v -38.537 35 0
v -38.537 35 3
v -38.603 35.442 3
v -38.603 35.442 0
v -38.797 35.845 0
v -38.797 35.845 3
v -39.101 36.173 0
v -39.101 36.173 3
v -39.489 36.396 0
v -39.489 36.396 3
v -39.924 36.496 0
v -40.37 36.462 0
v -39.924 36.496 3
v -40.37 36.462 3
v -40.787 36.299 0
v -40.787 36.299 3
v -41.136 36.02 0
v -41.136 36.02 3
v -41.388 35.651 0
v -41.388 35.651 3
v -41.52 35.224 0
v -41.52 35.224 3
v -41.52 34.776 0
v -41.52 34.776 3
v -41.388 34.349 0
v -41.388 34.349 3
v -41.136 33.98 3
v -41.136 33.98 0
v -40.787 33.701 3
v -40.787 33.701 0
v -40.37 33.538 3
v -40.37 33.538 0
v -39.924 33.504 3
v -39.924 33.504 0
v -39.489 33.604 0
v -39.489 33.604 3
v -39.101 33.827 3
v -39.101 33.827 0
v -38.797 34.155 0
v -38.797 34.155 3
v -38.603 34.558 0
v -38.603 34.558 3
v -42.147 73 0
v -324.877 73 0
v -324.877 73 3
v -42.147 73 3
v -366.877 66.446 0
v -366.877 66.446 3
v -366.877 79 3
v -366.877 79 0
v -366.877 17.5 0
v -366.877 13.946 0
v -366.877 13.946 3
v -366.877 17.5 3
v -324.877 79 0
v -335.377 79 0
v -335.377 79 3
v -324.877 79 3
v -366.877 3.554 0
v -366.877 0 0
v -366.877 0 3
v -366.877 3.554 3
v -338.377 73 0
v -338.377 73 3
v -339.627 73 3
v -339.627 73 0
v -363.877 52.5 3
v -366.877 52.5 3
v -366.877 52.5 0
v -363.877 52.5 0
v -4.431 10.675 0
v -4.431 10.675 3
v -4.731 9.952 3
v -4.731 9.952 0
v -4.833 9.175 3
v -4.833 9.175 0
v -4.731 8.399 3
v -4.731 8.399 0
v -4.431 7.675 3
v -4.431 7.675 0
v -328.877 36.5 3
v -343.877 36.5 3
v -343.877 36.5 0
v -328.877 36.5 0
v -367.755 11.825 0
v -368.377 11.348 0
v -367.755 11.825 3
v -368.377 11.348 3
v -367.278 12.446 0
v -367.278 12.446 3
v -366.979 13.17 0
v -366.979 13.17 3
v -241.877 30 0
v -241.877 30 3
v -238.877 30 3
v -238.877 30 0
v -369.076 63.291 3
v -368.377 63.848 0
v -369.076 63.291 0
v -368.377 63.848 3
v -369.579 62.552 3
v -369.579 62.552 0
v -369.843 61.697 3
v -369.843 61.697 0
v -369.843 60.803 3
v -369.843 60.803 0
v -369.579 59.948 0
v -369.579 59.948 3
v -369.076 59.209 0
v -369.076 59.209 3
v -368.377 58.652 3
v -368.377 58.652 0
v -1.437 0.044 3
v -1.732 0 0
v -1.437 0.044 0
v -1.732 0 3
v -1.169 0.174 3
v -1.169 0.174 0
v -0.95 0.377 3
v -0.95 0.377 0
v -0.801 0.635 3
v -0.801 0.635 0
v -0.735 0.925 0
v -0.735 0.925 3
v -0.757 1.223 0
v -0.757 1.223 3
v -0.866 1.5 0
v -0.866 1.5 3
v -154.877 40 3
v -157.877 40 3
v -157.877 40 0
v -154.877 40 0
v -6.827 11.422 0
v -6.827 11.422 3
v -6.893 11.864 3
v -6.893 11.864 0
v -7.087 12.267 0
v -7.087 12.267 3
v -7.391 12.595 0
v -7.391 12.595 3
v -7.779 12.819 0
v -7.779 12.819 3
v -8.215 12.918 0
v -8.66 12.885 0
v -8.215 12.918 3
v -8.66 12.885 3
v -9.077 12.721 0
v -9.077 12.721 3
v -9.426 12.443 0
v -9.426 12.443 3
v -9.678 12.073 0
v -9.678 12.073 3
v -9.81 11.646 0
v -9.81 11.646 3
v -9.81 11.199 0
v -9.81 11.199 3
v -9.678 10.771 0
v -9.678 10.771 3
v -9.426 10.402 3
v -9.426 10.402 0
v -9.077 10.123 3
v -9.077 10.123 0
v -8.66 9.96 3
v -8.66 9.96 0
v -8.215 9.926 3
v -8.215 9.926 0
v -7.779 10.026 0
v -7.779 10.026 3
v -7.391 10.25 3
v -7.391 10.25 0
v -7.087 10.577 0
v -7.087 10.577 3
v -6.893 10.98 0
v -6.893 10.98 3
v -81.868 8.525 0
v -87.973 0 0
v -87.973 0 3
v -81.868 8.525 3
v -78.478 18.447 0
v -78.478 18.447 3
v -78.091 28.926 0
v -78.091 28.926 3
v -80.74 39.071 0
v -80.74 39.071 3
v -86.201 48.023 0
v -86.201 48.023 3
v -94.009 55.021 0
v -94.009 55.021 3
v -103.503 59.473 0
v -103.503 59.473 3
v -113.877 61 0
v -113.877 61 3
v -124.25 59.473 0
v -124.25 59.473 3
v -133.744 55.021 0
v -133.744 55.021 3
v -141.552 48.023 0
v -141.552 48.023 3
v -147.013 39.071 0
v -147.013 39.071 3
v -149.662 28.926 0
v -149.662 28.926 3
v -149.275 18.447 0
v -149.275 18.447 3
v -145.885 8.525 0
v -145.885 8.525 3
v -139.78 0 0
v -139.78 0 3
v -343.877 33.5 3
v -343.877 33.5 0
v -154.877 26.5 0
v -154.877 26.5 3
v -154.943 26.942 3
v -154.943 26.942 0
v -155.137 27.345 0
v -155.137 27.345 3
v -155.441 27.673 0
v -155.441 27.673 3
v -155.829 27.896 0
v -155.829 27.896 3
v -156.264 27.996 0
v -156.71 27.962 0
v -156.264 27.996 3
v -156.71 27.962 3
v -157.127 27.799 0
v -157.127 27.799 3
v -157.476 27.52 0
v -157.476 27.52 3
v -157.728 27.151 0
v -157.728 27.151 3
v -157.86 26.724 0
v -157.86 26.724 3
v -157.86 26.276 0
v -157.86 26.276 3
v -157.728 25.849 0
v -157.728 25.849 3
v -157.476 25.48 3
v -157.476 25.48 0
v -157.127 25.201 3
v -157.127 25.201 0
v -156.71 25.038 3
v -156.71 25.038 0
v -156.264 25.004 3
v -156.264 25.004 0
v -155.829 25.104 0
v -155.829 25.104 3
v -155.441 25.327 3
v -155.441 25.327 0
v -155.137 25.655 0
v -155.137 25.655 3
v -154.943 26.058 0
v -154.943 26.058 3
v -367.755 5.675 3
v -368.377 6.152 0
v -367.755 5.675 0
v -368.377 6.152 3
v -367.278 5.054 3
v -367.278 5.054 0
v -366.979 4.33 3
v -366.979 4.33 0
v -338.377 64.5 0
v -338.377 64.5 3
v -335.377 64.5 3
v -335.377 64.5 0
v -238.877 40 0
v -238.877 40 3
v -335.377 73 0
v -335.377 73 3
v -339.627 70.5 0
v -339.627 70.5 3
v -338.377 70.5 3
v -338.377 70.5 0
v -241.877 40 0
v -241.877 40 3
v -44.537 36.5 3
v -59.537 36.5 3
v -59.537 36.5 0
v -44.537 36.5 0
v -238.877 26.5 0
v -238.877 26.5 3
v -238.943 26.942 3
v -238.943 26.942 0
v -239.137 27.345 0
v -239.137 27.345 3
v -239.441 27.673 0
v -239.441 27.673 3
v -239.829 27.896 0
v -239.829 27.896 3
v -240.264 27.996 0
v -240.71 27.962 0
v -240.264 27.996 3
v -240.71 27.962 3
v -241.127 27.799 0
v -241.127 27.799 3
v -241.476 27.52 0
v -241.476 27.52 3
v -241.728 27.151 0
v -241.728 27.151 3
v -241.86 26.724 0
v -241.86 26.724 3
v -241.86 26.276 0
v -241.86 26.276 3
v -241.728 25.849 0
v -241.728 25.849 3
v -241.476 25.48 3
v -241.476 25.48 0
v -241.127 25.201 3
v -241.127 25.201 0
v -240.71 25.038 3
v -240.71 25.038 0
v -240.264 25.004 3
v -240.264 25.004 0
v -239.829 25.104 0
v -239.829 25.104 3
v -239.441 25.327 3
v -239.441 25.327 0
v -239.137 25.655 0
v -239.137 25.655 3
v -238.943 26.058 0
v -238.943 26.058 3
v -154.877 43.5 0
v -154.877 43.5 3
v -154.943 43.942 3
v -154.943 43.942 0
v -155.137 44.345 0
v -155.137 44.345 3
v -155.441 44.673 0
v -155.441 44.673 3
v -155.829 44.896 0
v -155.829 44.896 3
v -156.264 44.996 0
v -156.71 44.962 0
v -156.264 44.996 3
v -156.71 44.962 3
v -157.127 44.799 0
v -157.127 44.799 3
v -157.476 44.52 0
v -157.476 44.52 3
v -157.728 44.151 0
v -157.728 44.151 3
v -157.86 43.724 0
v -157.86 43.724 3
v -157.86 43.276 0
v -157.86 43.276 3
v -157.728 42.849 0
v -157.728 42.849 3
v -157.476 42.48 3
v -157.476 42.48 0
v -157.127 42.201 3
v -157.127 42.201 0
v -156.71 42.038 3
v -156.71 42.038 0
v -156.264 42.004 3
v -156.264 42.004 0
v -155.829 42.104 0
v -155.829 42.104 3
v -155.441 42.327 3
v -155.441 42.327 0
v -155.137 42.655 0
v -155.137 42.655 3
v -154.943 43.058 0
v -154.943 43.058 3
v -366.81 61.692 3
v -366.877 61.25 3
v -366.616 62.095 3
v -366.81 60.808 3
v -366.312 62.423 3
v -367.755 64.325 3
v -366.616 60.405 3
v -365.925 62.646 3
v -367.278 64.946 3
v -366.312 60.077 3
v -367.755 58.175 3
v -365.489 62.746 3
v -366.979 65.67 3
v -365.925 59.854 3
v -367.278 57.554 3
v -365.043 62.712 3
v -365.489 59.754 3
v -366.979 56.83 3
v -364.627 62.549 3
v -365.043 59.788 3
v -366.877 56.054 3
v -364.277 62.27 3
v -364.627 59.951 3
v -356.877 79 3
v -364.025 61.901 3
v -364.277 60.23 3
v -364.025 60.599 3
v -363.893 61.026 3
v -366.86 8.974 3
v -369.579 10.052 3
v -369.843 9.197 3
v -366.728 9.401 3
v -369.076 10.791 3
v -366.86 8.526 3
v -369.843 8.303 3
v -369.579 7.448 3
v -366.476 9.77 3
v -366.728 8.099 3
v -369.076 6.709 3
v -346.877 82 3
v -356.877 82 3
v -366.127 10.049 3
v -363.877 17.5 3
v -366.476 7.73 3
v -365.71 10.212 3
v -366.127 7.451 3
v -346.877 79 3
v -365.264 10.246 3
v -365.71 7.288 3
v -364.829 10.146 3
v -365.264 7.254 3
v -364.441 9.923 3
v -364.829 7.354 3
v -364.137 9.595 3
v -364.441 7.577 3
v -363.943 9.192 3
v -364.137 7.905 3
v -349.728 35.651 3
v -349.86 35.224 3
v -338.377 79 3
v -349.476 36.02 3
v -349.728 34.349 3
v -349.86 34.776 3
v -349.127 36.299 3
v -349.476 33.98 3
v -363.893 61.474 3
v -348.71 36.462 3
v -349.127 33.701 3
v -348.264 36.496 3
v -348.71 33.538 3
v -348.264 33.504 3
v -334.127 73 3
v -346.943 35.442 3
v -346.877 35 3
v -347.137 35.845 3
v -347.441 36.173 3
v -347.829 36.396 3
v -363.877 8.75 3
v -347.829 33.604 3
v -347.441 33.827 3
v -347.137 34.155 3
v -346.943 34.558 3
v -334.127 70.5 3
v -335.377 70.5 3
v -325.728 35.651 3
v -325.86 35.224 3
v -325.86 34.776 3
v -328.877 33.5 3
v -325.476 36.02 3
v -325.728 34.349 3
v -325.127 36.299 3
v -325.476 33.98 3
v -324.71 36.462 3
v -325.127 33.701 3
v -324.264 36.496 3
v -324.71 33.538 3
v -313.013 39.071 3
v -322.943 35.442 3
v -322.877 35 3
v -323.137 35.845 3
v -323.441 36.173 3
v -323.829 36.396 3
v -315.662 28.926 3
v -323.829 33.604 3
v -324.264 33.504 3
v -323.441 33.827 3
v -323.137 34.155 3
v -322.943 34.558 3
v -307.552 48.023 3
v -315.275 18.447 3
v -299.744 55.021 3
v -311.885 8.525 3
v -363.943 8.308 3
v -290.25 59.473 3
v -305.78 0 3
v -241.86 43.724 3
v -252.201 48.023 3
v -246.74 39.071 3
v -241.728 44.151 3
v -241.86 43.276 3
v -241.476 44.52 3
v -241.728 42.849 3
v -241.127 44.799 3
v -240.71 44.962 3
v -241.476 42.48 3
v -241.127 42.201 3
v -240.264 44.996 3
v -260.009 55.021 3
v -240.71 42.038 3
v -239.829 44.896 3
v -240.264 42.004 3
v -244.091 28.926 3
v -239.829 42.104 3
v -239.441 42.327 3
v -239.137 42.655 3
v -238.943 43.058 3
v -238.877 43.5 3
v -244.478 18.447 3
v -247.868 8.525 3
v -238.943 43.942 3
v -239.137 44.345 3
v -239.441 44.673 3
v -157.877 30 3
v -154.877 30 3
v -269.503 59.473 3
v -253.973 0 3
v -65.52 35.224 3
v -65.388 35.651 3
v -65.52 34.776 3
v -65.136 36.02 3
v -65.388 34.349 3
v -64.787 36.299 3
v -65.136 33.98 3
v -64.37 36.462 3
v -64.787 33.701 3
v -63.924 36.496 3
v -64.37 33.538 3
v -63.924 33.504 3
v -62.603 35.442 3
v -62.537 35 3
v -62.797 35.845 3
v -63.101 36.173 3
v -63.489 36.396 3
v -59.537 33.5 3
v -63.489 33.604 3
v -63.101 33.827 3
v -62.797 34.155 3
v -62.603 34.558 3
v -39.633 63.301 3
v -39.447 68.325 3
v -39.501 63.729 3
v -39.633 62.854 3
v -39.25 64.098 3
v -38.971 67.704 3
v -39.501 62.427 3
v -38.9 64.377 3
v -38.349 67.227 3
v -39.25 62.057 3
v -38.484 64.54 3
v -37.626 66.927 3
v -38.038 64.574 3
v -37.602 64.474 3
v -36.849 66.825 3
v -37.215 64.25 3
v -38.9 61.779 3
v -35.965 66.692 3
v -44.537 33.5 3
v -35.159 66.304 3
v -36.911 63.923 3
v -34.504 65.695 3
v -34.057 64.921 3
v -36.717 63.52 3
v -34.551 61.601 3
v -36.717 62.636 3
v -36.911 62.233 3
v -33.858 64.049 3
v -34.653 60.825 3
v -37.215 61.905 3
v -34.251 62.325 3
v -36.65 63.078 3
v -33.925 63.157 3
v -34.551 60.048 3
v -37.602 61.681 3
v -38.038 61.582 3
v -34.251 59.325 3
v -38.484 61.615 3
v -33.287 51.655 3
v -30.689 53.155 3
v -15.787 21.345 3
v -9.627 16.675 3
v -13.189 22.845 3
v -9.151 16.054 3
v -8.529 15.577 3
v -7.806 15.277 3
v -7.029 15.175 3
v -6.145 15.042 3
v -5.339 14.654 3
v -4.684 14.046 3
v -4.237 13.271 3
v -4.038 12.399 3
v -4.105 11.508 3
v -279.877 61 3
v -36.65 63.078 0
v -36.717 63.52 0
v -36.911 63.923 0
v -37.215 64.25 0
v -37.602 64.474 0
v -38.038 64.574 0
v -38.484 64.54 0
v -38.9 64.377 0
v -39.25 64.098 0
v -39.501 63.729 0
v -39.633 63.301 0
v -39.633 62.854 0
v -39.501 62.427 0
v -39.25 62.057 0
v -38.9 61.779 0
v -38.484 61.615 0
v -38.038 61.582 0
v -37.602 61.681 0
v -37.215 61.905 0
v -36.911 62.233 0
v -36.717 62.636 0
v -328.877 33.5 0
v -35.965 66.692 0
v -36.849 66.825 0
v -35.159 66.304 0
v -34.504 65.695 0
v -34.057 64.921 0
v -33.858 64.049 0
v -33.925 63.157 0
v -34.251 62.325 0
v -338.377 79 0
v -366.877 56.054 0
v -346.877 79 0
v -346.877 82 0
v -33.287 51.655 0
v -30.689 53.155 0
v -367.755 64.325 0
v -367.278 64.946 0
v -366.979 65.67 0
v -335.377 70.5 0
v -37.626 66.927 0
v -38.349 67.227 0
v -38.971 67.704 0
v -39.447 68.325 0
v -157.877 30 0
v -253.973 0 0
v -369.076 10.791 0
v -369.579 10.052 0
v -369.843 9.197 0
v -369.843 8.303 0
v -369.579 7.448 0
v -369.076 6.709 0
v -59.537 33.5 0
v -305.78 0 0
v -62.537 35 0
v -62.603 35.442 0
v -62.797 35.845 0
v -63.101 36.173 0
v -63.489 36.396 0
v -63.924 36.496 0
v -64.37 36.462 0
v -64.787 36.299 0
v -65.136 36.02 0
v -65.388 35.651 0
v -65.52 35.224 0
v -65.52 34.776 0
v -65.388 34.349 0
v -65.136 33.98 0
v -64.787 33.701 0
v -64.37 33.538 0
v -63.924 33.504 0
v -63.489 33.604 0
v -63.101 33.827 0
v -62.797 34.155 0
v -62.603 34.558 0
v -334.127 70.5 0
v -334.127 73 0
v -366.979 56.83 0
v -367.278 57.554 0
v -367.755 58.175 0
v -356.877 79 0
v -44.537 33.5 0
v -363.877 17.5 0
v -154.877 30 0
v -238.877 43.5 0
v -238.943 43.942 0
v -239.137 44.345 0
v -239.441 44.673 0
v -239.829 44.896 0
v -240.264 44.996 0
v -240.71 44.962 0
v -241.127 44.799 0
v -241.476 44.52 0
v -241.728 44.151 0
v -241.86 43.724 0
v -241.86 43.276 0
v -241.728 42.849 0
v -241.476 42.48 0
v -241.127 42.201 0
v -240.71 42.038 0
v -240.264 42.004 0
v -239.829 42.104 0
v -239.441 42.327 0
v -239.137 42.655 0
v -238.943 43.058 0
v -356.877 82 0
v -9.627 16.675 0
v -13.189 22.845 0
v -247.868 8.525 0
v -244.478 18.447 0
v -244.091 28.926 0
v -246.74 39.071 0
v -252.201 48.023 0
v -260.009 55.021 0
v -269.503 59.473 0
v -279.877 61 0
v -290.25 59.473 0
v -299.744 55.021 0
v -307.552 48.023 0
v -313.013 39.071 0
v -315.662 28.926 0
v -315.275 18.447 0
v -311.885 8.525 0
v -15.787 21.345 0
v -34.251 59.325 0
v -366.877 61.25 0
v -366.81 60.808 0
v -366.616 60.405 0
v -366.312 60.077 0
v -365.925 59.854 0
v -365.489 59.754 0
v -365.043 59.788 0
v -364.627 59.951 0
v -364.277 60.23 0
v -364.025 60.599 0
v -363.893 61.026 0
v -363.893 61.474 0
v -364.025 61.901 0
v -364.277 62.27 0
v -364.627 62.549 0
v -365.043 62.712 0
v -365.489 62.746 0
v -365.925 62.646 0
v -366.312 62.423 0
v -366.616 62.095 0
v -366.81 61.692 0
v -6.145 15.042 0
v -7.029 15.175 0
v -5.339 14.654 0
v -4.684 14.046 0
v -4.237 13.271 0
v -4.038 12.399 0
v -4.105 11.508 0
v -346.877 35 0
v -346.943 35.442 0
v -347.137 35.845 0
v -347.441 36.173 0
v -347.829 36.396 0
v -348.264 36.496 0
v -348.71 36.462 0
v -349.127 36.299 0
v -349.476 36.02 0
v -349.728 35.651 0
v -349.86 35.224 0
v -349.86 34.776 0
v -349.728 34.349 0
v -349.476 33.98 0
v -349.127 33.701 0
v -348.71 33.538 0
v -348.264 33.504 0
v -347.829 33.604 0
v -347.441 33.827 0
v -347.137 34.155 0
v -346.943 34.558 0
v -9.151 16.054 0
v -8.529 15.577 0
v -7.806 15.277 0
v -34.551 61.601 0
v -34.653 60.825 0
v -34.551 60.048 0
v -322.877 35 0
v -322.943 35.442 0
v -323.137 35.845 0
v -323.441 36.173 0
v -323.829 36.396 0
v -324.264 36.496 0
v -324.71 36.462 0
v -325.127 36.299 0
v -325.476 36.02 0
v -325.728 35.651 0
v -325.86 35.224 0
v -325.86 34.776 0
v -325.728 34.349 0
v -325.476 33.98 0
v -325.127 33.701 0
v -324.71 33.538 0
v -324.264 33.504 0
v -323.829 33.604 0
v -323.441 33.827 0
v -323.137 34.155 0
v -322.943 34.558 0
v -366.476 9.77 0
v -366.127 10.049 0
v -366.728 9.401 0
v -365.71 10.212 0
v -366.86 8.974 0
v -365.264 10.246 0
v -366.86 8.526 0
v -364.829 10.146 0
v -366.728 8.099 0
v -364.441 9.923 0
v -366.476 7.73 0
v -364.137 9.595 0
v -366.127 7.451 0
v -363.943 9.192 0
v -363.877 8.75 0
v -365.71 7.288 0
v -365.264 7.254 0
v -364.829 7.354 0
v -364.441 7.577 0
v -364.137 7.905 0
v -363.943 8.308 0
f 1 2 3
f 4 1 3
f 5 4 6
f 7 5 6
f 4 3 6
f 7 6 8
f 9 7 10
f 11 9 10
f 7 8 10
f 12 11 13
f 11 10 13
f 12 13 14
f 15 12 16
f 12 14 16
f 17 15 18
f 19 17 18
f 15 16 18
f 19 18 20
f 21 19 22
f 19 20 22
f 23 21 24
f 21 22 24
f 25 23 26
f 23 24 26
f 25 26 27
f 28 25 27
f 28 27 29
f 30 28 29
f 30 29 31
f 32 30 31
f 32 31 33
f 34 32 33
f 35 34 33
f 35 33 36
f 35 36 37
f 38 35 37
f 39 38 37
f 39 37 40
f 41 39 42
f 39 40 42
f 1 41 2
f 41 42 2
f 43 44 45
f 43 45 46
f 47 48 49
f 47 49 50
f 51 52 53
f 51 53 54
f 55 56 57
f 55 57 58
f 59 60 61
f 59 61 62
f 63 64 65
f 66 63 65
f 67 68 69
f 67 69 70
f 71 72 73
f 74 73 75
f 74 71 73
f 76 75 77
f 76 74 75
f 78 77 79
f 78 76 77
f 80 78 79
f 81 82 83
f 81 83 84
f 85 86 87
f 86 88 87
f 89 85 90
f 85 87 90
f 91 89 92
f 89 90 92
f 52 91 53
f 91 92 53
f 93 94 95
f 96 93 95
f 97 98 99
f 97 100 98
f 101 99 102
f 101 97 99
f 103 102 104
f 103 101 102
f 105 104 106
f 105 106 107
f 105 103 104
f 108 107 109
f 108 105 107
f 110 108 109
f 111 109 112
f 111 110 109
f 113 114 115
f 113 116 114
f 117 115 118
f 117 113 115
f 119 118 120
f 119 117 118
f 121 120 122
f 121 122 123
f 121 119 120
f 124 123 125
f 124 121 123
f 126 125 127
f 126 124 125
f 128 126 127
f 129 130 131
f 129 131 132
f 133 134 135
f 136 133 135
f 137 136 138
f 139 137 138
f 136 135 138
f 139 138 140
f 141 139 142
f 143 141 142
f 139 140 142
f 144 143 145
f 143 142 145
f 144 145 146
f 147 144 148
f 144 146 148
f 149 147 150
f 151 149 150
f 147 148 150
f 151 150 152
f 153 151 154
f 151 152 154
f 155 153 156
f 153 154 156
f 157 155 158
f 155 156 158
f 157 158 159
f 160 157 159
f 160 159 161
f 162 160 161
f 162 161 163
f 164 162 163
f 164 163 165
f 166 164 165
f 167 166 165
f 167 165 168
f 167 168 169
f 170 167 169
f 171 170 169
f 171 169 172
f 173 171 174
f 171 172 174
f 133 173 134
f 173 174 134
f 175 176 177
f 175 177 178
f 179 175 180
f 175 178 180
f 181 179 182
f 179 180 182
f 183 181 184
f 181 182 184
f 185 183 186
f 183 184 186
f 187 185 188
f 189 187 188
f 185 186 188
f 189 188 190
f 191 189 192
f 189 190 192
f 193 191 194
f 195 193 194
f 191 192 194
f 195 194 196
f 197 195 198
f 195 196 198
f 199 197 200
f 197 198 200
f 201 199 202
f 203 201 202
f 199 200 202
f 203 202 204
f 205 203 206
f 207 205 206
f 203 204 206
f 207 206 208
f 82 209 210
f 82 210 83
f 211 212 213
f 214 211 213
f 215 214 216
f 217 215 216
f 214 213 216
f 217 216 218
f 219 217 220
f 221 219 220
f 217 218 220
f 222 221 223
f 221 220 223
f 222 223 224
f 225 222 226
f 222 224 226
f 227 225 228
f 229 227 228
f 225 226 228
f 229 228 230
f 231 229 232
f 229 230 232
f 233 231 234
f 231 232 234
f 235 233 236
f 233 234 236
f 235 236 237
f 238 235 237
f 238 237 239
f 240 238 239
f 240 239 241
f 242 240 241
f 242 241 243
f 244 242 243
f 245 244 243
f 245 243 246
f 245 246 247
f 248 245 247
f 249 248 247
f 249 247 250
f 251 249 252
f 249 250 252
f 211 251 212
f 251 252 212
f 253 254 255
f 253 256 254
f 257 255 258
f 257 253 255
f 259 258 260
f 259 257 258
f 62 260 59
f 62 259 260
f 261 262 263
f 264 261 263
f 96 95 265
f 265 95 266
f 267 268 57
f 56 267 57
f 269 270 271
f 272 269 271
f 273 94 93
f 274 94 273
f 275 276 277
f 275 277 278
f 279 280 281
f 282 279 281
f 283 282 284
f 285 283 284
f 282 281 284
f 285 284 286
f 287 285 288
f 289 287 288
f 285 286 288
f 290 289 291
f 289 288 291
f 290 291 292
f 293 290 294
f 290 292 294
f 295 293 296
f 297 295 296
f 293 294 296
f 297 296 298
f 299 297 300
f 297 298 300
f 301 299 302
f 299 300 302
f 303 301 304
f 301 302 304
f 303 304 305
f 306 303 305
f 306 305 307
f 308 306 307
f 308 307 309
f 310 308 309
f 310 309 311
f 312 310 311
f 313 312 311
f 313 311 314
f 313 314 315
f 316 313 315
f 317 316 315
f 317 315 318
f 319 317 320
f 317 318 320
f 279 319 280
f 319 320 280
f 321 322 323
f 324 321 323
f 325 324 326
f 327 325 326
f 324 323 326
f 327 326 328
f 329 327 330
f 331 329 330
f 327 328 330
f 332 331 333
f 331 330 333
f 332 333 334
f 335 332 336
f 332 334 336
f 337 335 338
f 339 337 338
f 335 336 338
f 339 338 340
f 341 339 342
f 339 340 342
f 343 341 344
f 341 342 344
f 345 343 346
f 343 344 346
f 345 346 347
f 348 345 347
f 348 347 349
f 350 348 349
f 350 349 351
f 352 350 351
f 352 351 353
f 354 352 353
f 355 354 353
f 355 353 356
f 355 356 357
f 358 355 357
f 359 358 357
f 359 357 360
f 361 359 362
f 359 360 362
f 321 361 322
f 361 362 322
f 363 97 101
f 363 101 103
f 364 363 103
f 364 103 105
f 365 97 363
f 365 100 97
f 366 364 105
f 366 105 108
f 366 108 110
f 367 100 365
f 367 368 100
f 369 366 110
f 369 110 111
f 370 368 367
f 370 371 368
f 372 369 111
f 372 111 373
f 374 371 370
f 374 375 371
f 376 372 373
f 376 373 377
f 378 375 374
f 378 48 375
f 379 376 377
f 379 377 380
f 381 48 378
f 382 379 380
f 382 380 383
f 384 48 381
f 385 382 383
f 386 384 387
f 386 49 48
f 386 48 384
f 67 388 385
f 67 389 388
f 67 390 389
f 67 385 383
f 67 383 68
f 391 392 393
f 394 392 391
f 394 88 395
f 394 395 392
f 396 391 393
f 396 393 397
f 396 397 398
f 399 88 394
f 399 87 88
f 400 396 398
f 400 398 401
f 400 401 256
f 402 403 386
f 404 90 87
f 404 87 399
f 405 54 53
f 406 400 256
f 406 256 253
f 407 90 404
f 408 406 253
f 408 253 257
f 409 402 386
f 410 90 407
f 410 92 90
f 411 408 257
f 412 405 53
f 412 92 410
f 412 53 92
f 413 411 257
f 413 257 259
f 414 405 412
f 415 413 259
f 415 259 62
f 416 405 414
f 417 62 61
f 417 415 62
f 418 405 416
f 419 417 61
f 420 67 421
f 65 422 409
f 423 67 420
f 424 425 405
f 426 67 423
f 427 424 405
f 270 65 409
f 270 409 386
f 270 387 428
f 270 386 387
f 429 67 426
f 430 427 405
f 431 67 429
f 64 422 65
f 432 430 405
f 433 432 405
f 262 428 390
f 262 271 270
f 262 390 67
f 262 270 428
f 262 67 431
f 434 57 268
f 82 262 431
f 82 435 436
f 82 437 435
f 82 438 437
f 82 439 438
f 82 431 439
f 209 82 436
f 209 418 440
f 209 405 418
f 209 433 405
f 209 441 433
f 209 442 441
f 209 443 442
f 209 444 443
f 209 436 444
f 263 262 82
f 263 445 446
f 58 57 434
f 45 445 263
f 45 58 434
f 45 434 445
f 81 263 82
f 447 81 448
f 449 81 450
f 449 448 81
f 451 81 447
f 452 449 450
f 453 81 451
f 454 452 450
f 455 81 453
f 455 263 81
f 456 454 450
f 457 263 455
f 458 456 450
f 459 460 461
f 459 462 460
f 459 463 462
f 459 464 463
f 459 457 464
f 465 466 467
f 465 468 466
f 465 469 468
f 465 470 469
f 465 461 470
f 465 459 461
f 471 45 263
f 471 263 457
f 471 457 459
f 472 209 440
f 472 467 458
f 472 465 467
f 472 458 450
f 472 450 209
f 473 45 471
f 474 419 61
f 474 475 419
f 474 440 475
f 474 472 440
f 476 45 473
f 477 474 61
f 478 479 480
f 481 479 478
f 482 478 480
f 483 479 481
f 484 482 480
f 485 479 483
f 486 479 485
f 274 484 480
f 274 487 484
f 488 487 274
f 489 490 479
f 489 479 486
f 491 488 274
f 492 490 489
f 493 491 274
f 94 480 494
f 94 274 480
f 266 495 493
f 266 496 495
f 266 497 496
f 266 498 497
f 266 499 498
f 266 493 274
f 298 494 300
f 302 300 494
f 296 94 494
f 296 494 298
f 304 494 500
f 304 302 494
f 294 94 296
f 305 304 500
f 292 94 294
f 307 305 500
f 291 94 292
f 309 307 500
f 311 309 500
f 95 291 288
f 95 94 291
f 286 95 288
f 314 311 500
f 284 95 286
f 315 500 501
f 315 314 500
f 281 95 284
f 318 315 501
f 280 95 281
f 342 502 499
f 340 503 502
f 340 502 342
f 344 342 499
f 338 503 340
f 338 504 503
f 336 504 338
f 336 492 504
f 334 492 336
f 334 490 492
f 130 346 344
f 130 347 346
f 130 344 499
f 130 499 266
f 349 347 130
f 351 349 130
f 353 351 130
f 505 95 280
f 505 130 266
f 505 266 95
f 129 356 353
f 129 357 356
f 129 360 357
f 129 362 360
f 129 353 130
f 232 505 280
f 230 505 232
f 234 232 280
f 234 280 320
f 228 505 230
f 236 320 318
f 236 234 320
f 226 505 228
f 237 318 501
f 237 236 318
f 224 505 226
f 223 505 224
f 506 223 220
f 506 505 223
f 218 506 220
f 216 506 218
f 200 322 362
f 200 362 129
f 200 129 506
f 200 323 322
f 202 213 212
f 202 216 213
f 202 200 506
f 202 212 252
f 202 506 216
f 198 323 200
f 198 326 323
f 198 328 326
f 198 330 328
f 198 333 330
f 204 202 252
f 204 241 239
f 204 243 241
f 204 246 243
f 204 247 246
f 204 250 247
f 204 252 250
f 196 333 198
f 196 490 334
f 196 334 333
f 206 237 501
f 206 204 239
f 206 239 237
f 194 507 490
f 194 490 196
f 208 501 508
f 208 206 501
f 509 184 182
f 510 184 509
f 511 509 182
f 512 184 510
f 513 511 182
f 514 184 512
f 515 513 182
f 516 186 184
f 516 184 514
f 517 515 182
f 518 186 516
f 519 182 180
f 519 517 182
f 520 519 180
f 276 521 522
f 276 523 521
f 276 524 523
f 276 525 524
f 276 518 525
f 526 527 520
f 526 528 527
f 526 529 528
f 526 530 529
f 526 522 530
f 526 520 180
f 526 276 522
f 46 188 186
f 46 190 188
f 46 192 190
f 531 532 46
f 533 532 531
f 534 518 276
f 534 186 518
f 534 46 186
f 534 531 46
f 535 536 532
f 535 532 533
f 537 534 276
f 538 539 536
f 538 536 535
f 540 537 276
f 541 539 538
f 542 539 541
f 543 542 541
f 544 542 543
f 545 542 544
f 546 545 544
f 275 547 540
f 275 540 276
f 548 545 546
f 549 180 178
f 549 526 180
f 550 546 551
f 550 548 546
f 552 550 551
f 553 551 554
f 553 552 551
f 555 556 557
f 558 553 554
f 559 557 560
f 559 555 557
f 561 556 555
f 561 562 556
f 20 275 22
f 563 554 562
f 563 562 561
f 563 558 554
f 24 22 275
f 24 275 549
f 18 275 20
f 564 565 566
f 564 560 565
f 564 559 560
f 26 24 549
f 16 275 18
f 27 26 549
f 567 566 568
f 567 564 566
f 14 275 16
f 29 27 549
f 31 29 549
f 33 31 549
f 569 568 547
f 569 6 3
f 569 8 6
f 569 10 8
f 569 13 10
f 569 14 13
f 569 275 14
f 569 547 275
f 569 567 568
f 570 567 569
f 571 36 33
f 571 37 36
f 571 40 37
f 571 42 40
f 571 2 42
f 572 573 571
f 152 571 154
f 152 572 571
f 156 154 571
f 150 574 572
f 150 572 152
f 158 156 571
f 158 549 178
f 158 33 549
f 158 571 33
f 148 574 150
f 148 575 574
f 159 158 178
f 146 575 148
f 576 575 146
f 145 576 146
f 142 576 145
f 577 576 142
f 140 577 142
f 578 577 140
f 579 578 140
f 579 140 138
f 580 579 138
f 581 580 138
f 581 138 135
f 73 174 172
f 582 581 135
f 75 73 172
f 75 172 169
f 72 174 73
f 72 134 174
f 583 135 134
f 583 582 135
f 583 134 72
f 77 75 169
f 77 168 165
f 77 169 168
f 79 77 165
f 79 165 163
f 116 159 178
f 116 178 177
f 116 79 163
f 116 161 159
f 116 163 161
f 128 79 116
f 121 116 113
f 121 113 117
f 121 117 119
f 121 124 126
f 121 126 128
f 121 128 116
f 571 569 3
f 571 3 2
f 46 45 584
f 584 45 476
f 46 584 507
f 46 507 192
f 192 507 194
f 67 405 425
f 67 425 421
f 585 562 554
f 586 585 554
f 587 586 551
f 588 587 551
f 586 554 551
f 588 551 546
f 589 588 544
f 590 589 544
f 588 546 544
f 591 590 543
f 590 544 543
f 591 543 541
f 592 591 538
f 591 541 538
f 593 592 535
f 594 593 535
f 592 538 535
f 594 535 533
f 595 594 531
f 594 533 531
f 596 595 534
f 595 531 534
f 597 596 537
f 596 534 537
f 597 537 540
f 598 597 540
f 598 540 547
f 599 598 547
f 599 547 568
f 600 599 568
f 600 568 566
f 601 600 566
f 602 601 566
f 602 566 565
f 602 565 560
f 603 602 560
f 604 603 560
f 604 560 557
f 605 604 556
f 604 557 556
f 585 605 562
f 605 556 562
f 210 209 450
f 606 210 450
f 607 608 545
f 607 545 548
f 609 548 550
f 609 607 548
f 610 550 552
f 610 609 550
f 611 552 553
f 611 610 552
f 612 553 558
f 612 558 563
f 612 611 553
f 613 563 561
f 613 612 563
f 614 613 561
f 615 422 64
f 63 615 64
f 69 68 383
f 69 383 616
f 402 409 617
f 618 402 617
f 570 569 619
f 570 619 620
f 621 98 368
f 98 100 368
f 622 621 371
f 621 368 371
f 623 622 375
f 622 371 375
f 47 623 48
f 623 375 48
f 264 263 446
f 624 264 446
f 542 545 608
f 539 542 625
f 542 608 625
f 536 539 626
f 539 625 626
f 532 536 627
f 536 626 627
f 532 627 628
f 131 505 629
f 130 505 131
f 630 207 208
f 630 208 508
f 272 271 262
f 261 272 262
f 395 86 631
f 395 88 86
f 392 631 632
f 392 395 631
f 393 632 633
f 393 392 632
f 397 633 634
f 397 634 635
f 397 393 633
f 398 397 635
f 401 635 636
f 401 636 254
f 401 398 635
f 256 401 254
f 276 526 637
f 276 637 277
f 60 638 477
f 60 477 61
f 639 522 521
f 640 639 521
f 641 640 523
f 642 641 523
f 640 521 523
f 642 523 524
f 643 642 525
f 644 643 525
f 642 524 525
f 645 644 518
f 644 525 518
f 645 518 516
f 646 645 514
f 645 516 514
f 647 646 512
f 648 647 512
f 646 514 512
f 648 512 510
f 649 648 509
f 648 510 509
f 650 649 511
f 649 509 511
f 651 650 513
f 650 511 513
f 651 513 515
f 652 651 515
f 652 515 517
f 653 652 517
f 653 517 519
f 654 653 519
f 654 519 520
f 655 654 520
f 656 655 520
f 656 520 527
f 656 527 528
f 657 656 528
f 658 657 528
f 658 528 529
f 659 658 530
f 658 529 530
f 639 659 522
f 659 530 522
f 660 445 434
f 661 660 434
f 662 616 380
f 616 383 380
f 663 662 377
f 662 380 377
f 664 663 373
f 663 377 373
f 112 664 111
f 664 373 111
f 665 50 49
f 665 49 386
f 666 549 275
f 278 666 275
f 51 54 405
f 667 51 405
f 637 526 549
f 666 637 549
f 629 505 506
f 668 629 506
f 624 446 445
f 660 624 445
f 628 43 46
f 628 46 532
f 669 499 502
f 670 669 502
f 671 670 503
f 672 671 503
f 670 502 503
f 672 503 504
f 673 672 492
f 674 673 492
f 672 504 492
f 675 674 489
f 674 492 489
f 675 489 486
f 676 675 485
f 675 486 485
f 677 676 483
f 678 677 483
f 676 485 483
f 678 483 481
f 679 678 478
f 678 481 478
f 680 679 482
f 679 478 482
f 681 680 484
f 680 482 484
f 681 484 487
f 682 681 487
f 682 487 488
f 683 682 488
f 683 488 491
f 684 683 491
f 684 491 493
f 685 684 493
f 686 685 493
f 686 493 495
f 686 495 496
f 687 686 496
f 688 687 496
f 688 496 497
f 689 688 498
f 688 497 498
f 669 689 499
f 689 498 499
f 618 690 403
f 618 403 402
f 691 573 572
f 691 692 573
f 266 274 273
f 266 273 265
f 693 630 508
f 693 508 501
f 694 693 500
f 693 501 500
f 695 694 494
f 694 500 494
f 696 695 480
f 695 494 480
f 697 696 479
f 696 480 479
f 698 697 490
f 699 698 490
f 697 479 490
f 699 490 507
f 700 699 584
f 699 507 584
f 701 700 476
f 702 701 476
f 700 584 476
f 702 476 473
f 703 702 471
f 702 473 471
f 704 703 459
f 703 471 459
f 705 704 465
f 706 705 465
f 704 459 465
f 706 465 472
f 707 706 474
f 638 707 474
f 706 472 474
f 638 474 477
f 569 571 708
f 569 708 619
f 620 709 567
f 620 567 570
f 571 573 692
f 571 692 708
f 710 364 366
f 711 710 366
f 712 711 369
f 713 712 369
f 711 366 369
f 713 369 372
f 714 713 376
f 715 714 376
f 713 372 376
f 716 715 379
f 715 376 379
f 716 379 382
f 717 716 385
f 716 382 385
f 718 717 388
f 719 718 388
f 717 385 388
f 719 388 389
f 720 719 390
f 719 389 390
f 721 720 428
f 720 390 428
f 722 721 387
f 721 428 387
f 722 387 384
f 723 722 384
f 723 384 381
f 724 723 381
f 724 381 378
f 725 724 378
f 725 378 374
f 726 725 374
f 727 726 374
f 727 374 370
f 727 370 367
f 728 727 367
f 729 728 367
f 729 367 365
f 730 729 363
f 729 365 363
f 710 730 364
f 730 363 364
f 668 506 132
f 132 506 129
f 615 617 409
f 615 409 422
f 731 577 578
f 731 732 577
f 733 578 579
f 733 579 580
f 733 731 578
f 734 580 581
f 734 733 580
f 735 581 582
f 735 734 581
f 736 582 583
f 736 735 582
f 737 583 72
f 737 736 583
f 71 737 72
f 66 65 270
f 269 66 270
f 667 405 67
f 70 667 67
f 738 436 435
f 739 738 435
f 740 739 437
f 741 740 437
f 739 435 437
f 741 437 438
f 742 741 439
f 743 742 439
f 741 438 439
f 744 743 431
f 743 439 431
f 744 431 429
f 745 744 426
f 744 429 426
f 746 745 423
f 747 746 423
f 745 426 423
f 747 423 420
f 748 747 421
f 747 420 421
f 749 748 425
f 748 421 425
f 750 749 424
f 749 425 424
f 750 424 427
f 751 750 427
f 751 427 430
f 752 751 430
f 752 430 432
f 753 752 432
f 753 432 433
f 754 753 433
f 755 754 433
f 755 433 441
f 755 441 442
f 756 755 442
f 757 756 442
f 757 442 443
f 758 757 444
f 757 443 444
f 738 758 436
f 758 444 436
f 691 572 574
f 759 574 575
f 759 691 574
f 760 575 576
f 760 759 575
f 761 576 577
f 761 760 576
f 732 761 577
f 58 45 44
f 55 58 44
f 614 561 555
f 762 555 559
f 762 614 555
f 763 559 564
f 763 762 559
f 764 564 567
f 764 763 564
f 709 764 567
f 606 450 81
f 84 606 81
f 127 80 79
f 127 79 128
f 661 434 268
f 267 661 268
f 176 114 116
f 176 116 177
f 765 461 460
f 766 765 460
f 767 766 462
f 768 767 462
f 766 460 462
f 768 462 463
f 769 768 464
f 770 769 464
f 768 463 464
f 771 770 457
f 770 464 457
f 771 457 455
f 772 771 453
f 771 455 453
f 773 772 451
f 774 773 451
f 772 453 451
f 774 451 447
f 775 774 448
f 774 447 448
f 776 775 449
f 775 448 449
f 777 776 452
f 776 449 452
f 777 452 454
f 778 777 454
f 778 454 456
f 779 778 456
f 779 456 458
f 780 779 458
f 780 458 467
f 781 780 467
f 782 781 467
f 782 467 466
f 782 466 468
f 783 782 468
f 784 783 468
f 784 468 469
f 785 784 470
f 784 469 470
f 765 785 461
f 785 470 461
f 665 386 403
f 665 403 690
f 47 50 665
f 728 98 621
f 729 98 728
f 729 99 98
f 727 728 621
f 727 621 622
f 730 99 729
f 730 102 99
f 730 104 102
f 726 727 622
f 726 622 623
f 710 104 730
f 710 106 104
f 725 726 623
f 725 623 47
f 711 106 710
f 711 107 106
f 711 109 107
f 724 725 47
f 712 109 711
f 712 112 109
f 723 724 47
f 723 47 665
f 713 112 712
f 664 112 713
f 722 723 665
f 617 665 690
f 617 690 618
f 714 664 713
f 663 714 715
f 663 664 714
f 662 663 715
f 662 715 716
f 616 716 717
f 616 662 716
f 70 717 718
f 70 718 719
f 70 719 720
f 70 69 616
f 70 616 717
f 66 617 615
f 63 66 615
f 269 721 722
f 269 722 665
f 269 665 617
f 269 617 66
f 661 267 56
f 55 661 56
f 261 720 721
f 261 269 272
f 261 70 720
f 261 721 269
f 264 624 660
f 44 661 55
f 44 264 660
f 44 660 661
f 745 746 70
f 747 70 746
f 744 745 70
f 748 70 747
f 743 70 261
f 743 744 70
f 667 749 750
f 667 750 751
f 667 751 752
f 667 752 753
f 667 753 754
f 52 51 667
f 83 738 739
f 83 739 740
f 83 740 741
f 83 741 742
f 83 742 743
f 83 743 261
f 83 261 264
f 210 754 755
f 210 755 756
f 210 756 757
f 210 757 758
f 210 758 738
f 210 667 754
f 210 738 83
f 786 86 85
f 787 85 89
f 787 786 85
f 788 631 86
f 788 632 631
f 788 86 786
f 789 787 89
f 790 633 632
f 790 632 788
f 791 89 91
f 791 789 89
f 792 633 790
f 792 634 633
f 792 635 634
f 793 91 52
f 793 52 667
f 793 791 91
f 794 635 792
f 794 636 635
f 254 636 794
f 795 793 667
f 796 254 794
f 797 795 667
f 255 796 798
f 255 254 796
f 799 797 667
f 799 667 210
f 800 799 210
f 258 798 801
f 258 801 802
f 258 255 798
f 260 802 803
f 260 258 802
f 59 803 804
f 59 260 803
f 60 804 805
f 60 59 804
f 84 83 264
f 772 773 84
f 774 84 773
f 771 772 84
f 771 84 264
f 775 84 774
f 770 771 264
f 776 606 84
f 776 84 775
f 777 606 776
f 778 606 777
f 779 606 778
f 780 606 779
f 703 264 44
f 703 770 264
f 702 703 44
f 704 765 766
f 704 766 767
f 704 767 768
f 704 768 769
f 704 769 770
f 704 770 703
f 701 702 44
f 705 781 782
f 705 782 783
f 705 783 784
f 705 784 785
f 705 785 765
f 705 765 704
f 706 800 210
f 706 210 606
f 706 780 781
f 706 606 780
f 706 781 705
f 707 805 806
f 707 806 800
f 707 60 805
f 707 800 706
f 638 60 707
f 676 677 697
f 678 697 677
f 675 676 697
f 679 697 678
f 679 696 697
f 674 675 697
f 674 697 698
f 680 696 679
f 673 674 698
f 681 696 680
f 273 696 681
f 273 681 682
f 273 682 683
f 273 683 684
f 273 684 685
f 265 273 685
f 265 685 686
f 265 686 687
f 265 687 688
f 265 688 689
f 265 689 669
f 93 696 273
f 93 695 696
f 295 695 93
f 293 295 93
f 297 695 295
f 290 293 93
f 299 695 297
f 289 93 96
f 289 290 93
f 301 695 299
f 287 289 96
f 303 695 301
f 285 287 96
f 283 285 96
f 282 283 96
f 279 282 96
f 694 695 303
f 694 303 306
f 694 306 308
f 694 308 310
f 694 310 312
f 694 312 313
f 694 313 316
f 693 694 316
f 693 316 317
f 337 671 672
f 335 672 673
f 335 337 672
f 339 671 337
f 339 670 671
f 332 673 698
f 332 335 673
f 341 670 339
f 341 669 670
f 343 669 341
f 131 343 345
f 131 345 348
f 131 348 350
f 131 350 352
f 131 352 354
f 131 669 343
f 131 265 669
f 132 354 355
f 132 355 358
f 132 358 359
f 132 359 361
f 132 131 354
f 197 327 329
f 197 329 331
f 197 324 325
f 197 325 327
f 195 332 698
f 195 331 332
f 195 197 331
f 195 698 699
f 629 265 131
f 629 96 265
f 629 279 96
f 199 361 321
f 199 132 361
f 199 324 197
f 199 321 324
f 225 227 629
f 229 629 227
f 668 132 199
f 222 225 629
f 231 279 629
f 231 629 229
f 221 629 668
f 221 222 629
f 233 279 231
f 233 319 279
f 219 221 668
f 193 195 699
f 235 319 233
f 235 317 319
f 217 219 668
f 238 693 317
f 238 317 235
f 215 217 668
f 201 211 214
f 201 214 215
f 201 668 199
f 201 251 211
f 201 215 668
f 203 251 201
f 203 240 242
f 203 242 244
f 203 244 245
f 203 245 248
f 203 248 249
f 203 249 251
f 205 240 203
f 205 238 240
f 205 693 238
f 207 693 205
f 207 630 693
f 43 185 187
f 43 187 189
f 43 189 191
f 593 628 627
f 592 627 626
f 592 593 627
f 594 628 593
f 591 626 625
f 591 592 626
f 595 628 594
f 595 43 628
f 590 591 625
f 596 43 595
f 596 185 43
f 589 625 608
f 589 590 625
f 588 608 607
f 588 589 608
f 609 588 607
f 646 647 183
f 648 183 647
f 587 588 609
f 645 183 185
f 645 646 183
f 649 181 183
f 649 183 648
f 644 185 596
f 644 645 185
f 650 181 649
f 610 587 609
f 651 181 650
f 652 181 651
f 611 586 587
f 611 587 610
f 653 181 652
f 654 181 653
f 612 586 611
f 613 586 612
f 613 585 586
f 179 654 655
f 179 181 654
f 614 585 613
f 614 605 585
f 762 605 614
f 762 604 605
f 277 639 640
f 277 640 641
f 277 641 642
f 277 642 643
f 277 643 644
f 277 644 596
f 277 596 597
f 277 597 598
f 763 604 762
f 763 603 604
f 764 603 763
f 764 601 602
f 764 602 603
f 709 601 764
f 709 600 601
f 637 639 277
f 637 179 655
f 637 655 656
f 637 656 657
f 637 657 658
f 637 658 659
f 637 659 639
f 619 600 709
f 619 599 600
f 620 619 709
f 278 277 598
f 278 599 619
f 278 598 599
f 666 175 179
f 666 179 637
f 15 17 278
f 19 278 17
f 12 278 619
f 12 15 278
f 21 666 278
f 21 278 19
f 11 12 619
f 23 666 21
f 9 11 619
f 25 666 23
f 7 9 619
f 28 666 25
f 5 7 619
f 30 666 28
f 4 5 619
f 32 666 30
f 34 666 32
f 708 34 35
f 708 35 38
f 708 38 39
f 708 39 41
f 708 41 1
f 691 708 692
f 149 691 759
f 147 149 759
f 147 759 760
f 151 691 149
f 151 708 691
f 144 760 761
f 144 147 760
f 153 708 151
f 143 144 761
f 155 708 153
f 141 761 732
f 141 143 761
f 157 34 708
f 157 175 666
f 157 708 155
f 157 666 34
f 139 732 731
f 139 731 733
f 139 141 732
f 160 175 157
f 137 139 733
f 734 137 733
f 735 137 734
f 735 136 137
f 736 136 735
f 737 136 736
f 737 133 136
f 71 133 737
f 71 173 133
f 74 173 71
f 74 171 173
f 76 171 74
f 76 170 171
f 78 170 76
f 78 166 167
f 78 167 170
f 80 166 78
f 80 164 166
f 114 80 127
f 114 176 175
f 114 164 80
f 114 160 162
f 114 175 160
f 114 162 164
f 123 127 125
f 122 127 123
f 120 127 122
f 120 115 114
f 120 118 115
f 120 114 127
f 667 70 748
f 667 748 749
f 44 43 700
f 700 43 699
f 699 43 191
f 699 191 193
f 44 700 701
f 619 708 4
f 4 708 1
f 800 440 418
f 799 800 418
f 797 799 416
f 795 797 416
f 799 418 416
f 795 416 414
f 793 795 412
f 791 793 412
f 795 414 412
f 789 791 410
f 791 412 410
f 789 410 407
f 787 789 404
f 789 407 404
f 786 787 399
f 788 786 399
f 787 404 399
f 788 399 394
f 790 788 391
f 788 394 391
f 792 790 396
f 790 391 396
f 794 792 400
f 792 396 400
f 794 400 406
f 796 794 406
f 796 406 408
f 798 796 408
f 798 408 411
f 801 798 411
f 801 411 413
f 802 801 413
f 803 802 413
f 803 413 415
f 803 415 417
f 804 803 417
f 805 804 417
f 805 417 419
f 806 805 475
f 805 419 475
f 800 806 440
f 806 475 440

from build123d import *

# Parameters (mm, degrees)
EXTRUDE_1_DEPTH      = 3
SKETCH_2_W           = 3
SKETCH_2_H           = 35
CUT_EXTRUDE_1_DEPTH  = 3
CUT_EXTRUDE_2_DEPTH  = 3
SKETCH_4_W           = 3
SKETCH_4_H           = 10
CUT_EXTRUDE_3_DEPTH  = 3
SKETCH_5_W           = 15
SKETCH_5_H           = 3
CUT_EXTRUDE_4_DEPTH  = 3
SKETCH_6_W           = 42
SKETCH_6_H           = 3
EXTRUDE_2_DEPTH      = 6
SKETCH_8_W           = 3
SKETCH_8_H           = 3
SKETCH_9_W           = 3
SKETCH_9_H           = 3
SKETCH_7_R           = 1.5
CUT_EXTRUDE_6_DEPTH  = 3
FILLET_1_R           = 3
SKETCH_14_R          = 1.5
CUT_EXTRUDE_9_DEPTH  = 3
SKETCH_15_R          = 1.5
CUT_EXTRUDE_10_DEPTH = 3
SKETCH_16_W          = 3
SKETCH_16_H          = 3
SKETCH_17_W          = 3
SKETCH_17_H          = 3
SKETCH_18_R          = 1.5
CUT_EXTRUDE_11_DEPTH = 3
FILLET_2_R           = 3
SKETCH_19_R          = 36
CUT_EXTRUDE_12_DEPTH = 3
CUT_EXTRUDE_13_DEPTH = 3
SKETCH_21_W          = 10
SKETCH_21_H          = 3
EXTRUDE_3_DEPTH      = 3
FILLET_3_R           = 1


with BuildPart() as part:
    # Эскиз1 → Бобышка-Вытянуть1 (new body)
    with BuildSketch(Plane.XY):
        Polygon((-42.146569651, 73), (0, 0), (-366.876569651, 0), (-366.876569651, 73), align=None)
    extrude(amount=EXTRUDE_1_DEPTH)

    # Эскиз2 → Вырез-Вытянуть1 (cut)
    with BuildSketch(Plane.XY.offset(3)):
        with Locations((-365.376569651, 35)):
            Rectangle(SKETCH_2_W, SKETCH_2_H)
    extrude(amount=-CUT_EXTRUDE_1_DEPTH, mode=Mode.SUBTRACT)

    # Эскиз3 → Вырез-Вытянуть2 (cut)
    with BuildSketch(Plane.XY.offset(3)):
        Polygon((-33.287386441, 51.655444566), (-30.689310229, 53.155444566), (-13.189310229, 22.844555434), (-15.787386441, 21.344555434), align=None)
    extrude(amount=-CUT_EXTRUDE_2_DEPTH, mode=Mode.SUBTRACT)

    # Эскиз4 → Вырез-Вытянуть3 (cut)
    with BuildSketch(Plane.XY.offset(3)):
        with Locations((-240.376569651, 35)):
            Rectangle(SKETCH_4_W, SKETCH_4_H)
        with Locations((-156.376569651, 35)):
            Rectangle(SKETCH_4_W, SKETCH_4_H)
    extrude(amount=-CUT_EXTRUDE_3_DEPTH, mode=Mode.SUBTRACT)

    # Эскиз5 → Вырез-Вытянуть4 (cut)
    with BuildSketch(Plane.XY.offset(3)):
        with Locations((-336.376569651, 35)):
            Rectangle(SKETCH_5_W, SKETCH_5_H)
        with Locations((-52.036569651, 35)):
            Rectangle(SKETCH_5_W, SKETCH_5_H)
    extrude(amount=-CUT_EXTRUDE_4_DEPTH, mode=Mode.SUBTRACT)

    # Эскиз6 → Бобышка-Вытянуть2 (add)
    with BuildSketch(Plane(origin=(0, 73, 0), x_dir=(1, 0, 0), z_dir=(0, 1, 0))):
        with Locations((-345.876569651, -1.5)):
            Rectangle(SKETCH_6_W, SKETCH_6_H)
    extrude(amount=EXTRUDE_2_DEPTH)

    # Эскиз8 → Повернуть1 (revolve)
    with BuildSketch(Plane.ZY.offset(366.876569651)):
        with Locations((1.5, 7.25)):
            Rectangle(SKETCH_8_W, SKETCH_8_H)
    revolve(axis=Axis((-366.876569651, 8.75, 0), (0, 0, 1)))

    # Эскиз9 → Повернуть2 (revolve)
    with BuildSketch(Plane.ZY.offset(366.876569651)):
        with Locations((1.5, 59.75)):
            Rectangle(SKETCH_9_W, SKETCH_9_H)
    revolve(axis=Axis((-366.876569651, 61.25, 0), (0, 0, 1)))

    # Эскиз7 → Вырез-Вытянуть6 (cut)
    with BuildSketch(Plane.XY.offset(3)):
        with Locations((-365.376569651, 8.75)):
            Circle(SKETCH_7_R)
        with Locations(Location((-365.376569651, 61.25, 0), (0, 0, 180))):
            Circle(SKETCH_7_R)
    extrude(amount=-CUT_EXTRUDE_6_DEPTH, mode=Mode.SUBTRACT)

    # Скругление1
    fillet_1_edges = [part.edges().sort_by_distance(p)[0] for p in [
        (-366.876569651, 5.75, 1.5),
        (-366.876569651, 11.75, 1.5),
        (-366.876569651, 58.25, 1.5),
        (-366.876569651, 64.25, 1.5),
    ]]
    fillet(fillet_1_edges, radius=FILLET_1_R)

    # Эскиз14 → Вырез-Вытянуть9 (cut)
    with BuildSketch(Plane.XY.offset(3)):
        with Locations((-156.376569651, 43.5)):
            Circle(SKETCH_14_R)
        with Locations((-156.376569651, 26.5)):
            Circle(SKETCH_14_R)
        with Locations((-240.376569651, 26.5)):
            Circle(SKETCH_14_R)
        with Locations((-240.376569651, 43.5)):
            Circle(SKETCH_14_R)
    extrude(amount=-CUT_EXTRUDE_9_DEPTH, mode=Mode.SUBTRACT)

    # Эскиз15 → Вырез-Вытянуть10 (cut)
    with BuildSketch(Plane.XY.offset(3)):
        with Locations((-324.376569651, 35)):
            Circle(SKETCH_15_R)
        with Locations((-348.376569651, 35)):
            Circle(SKETCH_15_R)
        with Locations((-64.036569651, 35)):
            Circle(SKETCH_15_R)
        with Locations((-40.036569651, 35)):
            Circle(SKETCH_15_R)
    extrude(amount=-CUT_EXTRUDE_10_DEPTH, mode=Mode.SUBTRACT)

    # Эскиз16 → Повернуть3 (revolve)
    with BuildSketch(Plane(origin=(0, 0, 0), x_dir=(0, 0, -1), z_dir=(0.8660254037844265, 0.5000000000000212, 0))):
        with Locations((-1.5, 12.558620458)):
            Rectangle(SKETCH_16_W, SKETCH_16_H)
    revolve(axis=Axis((-7.029310229, 12.175122459, 3), (0, 0, -1)))

    # Эскиз17 → Повернуть4 (revolve)
    with BuildSketch(Plane(origin=(0, 0, 0), x_dir=(0, 0, -1), z_dir=(0.8660254037844265, 0.5000000000000212, 0))):
        with Locations((-1.5, 75.198620458)):
            Rectangle(SKETCH_17_W, SKETCH_17_H)
    revolve(axis=Axis((-36.849310229, 63.824877541, 3), (0, 0, -1)))

    # Эскиз18 → Вырез-Вытянуть11 (cut)
    with BuildSketch(Plane.XY.offset(3)):
        with Locations((-38.149990748, 63.077722283)):
            Circle(SKETCH_18_R)
        with Locations((-8.326705922, 11.422277717)):
            Circle(SKETCH_18_R)
    extrude(amount=-CUT_EXTRUDE_11_DEPTH, mode=Mode.SUBTRACT)

    # Скругление2
    fillet_2_edges = [part.edges().sort_by_distance(p)[0] for p in [
        (-5.529310229, 9.577046248, 1.5),
        (-8.529310229, 14.773198671, 1.5),
        (-35.349310229, 61.226801329, 1.5),
        (-38.349310229, 66.422953752, 1.5),
    ]]
    fillet(fillet_2_edges, radius=FILLET_2_R)

    # Эскиз19 → Вырез-Вытянуть12 (cut)
    with BuildSketch(Plane.XY.offset(3)):
        with Locations((-279.876569651, 25)):
            Circle(SKETCH_19_R)
        with Locations((-113.876569651, 25)):
            Circle(SKETCH_19_R)
    extrude(amount=-CUT_EXTRUDE_12_DEPTH, mode=Mode.SUBTRACT)

    # Эскиз20 → Вырез-Вытянуть13 (cut)
    with BuildSketch(Plane.XY.offset(3)):
        Polygon((-338.376569651, 79), (-338.376569651, 73), (-339.626569651, 73), (-339.626569651, 70.5), (-338.376569651, 70.5), (-338.376569651, 64.5), (-335.376569651, 64.5), (-335.376569651, 70.5), (-334.126569651, 70.5), (-334.126569651, 73), (-335.376569651, 73), (-335.376569651, 79), align=None)
    extrude(amount=-CUT_EXTRUDE_13_DEPTH, mode=Mode.SUBTRACT)

    # Эскиз21 → Бобышка-Вытянуть3 (add)
    with BuildSketch(Plane(origin=(0, 79, 0), x_dir=(1, 0, 0), z_dir=(0, 1, 0))):
        with Locations((-351.876569651, -1.5)):
            Rectangle(SKETCH_21_W, SKETCH_21_H)
    extrude(amount=EXTRUDE_3_DEPTH)

    # Скругление3
    fillet_3_edges = [part.edges().sort_by_distance(p)[0] for p in [
        (0, 0, 1.5),
    ]]
    fillet(fillet_3_edges, radius=FILLET_3_R)


solid = part.part
